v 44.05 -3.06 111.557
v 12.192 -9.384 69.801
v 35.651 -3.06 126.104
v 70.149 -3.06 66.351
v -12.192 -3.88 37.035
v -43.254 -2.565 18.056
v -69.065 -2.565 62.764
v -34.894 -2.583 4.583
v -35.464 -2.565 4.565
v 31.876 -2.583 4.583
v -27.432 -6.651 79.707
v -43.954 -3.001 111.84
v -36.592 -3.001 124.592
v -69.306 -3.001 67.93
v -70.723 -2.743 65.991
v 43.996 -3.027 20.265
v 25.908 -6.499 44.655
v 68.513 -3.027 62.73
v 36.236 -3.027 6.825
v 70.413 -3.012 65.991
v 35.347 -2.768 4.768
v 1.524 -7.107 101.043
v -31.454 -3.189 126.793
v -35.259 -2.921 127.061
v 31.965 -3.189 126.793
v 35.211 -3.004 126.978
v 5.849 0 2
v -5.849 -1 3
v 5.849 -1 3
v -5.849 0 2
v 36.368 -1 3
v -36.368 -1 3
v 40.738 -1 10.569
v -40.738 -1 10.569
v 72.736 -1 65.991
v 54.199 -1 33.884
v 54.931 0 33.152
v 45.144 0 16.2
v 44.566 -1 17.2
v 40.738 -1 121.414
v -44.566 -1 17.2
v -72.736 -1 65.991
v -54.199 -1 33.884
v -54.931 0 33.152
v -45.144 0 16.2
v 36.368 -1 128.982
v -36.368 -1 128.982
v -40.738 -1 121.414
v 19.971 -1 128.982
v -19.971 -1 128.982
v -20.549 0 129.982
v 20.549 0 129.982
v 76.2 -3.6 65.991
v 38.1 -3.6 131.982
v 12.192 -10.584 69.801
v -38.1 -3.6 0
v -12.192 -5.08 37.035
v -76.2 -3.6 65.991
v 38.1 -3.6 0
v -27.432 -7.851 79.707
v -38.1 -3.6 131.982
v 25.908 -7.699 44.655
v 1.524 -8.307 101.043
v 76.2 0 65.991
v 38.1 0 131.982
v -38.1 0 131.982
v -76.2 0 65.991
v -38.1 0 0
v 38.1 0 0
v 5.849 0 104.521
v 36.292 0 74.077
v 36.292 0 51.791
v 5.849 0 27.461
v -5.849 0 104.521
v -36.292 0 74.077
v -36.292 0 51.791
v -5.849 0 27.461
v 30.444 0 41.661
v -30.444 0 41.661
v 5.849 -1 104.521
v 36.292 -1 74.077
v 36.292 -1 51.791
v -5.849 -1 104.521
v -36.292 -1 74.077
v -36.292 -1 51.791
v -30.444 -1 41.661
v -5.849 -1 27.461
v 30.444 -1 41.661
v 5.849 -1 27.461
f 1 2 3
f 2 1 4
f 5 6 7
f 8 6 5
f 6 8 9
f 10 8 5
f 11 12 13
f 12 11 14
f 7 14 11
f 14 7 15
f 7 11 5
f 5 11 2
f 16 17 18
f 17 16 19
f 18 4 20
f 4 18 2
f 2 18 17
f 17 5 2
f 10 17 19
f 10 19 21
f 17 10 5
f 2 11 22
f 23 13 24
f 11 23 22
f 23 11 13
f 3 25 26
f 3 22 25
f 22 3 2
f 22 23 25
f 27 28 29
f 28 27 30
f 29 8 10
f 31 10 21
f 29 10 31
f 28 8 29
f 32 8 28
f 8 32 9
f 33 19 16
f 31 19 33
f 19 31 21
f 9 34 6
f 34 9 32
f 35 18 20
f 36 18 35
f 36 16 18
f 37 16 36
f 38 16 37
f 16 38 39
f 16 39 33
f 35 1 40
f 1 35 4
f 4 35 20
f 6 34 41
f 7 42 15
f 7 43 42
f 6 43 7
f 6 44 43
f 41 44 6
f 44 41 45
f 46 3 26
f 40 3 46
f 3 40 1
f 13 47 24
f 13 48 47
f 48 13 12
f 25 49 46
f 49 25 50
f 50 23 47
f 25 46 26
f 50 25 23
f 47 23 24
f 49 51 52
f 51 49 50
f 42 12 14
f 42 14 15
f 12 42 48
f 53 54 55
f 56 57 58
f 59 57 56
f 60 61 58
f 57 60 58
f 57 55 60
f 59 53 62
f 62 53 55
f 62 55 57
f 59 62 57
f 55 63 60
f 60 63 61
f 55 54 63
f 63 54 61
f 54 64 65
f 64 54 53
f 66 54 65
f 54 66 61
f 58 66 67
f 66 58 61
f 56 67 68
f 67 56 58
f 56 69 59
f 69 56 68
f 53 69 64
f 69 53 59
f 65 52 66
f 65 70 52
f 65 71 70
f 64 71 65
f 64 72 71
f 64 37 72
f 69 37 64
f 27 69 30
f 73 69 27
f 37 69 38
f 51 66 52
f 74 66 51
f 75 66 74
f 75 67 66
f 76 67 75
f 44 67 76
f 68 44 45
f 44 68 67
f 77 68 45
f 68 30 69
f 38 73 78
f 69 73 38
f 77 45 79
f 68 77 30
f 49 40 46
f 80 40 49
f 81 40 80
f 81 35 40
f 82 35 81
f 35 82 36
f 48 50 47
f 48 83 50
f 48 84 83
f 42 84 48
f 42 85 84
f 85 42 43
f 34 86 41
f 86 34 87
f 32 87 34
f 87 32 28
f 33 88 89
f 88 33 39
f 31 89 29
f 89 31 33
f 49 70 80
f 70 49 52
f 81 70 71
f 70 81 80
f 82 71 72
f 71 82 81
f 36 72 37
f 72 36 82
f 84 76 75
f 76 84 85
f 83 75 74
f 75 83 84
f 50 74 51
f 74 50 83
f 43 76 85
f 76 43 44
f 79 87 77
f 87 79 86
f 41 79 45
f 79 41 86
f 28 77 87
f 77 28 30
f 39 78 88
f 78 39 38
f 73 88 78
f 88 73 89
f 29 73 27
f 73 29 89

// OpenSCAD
// Hexagon wall tile v33 — parametric rebuild of v30
// Front: identical low-poly facets to v30 (same facet angles at every size).
// Edge profile: identical on every size (edge depth, rim width) so tiles butt flush.
// Back: six corner pads for 1" (25 mm) double-sided mounting tape.
// v32: tape pads are flat plates hung from the rim with an air gap to the front skin.
// v33: thinner skin + thinner pads so the air gap is 1.4 mm even right at the edges
//      (v32 had only 0.8 mm there and showed marks along the slanted edges).
// Prints upright on a flat edge with NO supports (every downward edge is 45° or steeper).
//
// Export one size at a time, e.g.:
//   openscad -D size_in=6 -o hex_tile_v33_6in.stl hex_wall_tile_v33.scad

/* [Size] */
size_in       = 6;      // point-to-point width in inches (3, 6, 10 ...)

/* [Edge profile — keep identical across sizes] */
// Space behind the skin at the edge = edge_depth - skin; it must be >= pad_plate + pad_gap + pad_recess.
edge_depth    = 3.6;    // depth of the outer edge, back plane to front face (mm)
rim           = 2.0;    // perimeter wall thickness at the back plane (mm)

/* [Front skin] */
skin          = 1.2;    // front skin thickness (mm) — 3 lines at 0.4 mm, same on all sizes

/* [Tape pads] */
tape_width    = 25.4;   // tape width (mm)
pad_margin    = 3;      // extra pad width beyond the tape (mm)
pad_max_frac  = 0.45;   // pad never larger than this fraction of the tile radius (keeps 3" usable)
pad_plate     = 1.0;    // thickness of the pad plates (mm)
pad_gap       = 1.4;    // minimum air gap between pads and the front skin (mm) — keeps the front clean
pad_recess    = 0;      // pads set back from the rim (mm); >0 lets the rim touch the wall,
                        // but near the edges the plate is then trimmed thinner to keep pad_gap

/* [Output] */
orient_for_print = true; // stand upright on a flat edge, back facing +Y

/* [Hidden] */
R   = size_in * 25.4 / 2;         // corner radius
AP  = R * cos(30);                // apothem
PAD = min(tape_width + pad_margin, R * pad_max_frac);

// Normalised front geometry from v30 (x, y in units of R; z = relief above edge, units of R)
FP = [[1,0,0],[0.5,0.866025,0],[-0.5,0.866025,0],[-1,0,0],[-0.5,-0.866025,0],[0.5,-0.866025,0],
      [0.16,0.05,0.091654],[-0.16,-0.38,0.019428],[-0.36,0.18,0.05579],[0.34,-0.28,0.053795],[0.02,0.46,0.061766]];
FACES = [[0,6,1],[4,3,7],[5,4,7],[8,3,2],[7,3,8],[7,8,6],[5,9,0],[9,6,0],[9,7,6],[5,7,9],
         [6,8,10],[8,2,10],[6,10,1],[10,2,1],
         [1,12,11,0],[2,13,12,1],[3,14,13,2],[4,15,14,3],[5,16,15,4],[0,11,16,5],
         [11,12,13,14,15,16]];
RELIEF_MAX = 0.091654 * R;
D = edge_depth + RELIEF_MAX + 1;  // max depth used for chamfers

// Solid bounded by the faceted front (shifted by dz) and a flat back at z = zb
module body(dz = 0, zb = 0) {
    pts = concat(
        [for (p = FP) [p[0]*R, p[1]*R, edge_depth + p[2]*R + dz]],
        [for (i = [0:5]) [FP[i][0]*R, FP[i][1]*R, zb]]);
    polyhedron(points = pts, faces = FACES, convexity = 4);
}

module hex2d(apothem) { circle(r = apothem / cos(30), $fn = 6); }

// Back cavity: behind the skin, inside the rim; rim inner faces slope 45° so nothing needs support
module cavity(extra = 0) {
    H  = D + 2;
    a0 = AP - rim - extra + 1;             // apothem at z = -1
    intersection() {
        body(dz = -skin - extra, zb = -1);
        translate([0, 0, -1]) linear_extrude(height = H, scale = (a0 - H) / a0) hex2d(a0);
    }
}

// Corner pad footprint (2D), k = corner index 0..5:
// the corner region of the inner hex, PAD wide, long enough to hold a PAD x PAD square of tape
module pad_core(k) {
    U0  = (AP - rim) / cos(30);                    // inner corner distance from centre
    LEN = PAD / (2 * tan(60)) + PAD + 1;           // apex taper + full square + margin
    intersection() {
        hex2d(AP - rim + 0.3);                     // overlap 0.3 mm into the rim to fuse
        rotate(60 * k) translate([U0 - LEN, -PAD / 2]) square([LEN + 5, PAD]);
    }
}

// In-plane self-support: printed upright, a vertical plate needs every downward edge at >= 45°.
// Sweep each pad toward the nearest rim side below it at 45° (or straight down for bottom corners).
SWEEP = [[1, -1], [1, -1], [-1, -1], [-1, -1], [0, -1], [0, -1]];
module pad_fp(k) {
    intersection() {
        hex2d(AP - rim + 0.3);
        hull() { pad_core(k); translate(SWEEP[k] * R) pad_core(k); }
    }
}

module pads() {
    intersection() {
        body(dz = -skin - pad_gap, zb = -1);       // never closer than pad_gap to the skin
        translate([0, 0, pad_recess]) linear_extrude(pad_plate) for (k = [0:5]) pad_fp(k);
    }
}

module tile() {
    union() {
        difference() { body(); cavity(); }
        pads();
    }
}

if (orient_for_print)
    translate([0, 0, AP]) rotate([90, 0, 0]) tile();
else
    tile();
